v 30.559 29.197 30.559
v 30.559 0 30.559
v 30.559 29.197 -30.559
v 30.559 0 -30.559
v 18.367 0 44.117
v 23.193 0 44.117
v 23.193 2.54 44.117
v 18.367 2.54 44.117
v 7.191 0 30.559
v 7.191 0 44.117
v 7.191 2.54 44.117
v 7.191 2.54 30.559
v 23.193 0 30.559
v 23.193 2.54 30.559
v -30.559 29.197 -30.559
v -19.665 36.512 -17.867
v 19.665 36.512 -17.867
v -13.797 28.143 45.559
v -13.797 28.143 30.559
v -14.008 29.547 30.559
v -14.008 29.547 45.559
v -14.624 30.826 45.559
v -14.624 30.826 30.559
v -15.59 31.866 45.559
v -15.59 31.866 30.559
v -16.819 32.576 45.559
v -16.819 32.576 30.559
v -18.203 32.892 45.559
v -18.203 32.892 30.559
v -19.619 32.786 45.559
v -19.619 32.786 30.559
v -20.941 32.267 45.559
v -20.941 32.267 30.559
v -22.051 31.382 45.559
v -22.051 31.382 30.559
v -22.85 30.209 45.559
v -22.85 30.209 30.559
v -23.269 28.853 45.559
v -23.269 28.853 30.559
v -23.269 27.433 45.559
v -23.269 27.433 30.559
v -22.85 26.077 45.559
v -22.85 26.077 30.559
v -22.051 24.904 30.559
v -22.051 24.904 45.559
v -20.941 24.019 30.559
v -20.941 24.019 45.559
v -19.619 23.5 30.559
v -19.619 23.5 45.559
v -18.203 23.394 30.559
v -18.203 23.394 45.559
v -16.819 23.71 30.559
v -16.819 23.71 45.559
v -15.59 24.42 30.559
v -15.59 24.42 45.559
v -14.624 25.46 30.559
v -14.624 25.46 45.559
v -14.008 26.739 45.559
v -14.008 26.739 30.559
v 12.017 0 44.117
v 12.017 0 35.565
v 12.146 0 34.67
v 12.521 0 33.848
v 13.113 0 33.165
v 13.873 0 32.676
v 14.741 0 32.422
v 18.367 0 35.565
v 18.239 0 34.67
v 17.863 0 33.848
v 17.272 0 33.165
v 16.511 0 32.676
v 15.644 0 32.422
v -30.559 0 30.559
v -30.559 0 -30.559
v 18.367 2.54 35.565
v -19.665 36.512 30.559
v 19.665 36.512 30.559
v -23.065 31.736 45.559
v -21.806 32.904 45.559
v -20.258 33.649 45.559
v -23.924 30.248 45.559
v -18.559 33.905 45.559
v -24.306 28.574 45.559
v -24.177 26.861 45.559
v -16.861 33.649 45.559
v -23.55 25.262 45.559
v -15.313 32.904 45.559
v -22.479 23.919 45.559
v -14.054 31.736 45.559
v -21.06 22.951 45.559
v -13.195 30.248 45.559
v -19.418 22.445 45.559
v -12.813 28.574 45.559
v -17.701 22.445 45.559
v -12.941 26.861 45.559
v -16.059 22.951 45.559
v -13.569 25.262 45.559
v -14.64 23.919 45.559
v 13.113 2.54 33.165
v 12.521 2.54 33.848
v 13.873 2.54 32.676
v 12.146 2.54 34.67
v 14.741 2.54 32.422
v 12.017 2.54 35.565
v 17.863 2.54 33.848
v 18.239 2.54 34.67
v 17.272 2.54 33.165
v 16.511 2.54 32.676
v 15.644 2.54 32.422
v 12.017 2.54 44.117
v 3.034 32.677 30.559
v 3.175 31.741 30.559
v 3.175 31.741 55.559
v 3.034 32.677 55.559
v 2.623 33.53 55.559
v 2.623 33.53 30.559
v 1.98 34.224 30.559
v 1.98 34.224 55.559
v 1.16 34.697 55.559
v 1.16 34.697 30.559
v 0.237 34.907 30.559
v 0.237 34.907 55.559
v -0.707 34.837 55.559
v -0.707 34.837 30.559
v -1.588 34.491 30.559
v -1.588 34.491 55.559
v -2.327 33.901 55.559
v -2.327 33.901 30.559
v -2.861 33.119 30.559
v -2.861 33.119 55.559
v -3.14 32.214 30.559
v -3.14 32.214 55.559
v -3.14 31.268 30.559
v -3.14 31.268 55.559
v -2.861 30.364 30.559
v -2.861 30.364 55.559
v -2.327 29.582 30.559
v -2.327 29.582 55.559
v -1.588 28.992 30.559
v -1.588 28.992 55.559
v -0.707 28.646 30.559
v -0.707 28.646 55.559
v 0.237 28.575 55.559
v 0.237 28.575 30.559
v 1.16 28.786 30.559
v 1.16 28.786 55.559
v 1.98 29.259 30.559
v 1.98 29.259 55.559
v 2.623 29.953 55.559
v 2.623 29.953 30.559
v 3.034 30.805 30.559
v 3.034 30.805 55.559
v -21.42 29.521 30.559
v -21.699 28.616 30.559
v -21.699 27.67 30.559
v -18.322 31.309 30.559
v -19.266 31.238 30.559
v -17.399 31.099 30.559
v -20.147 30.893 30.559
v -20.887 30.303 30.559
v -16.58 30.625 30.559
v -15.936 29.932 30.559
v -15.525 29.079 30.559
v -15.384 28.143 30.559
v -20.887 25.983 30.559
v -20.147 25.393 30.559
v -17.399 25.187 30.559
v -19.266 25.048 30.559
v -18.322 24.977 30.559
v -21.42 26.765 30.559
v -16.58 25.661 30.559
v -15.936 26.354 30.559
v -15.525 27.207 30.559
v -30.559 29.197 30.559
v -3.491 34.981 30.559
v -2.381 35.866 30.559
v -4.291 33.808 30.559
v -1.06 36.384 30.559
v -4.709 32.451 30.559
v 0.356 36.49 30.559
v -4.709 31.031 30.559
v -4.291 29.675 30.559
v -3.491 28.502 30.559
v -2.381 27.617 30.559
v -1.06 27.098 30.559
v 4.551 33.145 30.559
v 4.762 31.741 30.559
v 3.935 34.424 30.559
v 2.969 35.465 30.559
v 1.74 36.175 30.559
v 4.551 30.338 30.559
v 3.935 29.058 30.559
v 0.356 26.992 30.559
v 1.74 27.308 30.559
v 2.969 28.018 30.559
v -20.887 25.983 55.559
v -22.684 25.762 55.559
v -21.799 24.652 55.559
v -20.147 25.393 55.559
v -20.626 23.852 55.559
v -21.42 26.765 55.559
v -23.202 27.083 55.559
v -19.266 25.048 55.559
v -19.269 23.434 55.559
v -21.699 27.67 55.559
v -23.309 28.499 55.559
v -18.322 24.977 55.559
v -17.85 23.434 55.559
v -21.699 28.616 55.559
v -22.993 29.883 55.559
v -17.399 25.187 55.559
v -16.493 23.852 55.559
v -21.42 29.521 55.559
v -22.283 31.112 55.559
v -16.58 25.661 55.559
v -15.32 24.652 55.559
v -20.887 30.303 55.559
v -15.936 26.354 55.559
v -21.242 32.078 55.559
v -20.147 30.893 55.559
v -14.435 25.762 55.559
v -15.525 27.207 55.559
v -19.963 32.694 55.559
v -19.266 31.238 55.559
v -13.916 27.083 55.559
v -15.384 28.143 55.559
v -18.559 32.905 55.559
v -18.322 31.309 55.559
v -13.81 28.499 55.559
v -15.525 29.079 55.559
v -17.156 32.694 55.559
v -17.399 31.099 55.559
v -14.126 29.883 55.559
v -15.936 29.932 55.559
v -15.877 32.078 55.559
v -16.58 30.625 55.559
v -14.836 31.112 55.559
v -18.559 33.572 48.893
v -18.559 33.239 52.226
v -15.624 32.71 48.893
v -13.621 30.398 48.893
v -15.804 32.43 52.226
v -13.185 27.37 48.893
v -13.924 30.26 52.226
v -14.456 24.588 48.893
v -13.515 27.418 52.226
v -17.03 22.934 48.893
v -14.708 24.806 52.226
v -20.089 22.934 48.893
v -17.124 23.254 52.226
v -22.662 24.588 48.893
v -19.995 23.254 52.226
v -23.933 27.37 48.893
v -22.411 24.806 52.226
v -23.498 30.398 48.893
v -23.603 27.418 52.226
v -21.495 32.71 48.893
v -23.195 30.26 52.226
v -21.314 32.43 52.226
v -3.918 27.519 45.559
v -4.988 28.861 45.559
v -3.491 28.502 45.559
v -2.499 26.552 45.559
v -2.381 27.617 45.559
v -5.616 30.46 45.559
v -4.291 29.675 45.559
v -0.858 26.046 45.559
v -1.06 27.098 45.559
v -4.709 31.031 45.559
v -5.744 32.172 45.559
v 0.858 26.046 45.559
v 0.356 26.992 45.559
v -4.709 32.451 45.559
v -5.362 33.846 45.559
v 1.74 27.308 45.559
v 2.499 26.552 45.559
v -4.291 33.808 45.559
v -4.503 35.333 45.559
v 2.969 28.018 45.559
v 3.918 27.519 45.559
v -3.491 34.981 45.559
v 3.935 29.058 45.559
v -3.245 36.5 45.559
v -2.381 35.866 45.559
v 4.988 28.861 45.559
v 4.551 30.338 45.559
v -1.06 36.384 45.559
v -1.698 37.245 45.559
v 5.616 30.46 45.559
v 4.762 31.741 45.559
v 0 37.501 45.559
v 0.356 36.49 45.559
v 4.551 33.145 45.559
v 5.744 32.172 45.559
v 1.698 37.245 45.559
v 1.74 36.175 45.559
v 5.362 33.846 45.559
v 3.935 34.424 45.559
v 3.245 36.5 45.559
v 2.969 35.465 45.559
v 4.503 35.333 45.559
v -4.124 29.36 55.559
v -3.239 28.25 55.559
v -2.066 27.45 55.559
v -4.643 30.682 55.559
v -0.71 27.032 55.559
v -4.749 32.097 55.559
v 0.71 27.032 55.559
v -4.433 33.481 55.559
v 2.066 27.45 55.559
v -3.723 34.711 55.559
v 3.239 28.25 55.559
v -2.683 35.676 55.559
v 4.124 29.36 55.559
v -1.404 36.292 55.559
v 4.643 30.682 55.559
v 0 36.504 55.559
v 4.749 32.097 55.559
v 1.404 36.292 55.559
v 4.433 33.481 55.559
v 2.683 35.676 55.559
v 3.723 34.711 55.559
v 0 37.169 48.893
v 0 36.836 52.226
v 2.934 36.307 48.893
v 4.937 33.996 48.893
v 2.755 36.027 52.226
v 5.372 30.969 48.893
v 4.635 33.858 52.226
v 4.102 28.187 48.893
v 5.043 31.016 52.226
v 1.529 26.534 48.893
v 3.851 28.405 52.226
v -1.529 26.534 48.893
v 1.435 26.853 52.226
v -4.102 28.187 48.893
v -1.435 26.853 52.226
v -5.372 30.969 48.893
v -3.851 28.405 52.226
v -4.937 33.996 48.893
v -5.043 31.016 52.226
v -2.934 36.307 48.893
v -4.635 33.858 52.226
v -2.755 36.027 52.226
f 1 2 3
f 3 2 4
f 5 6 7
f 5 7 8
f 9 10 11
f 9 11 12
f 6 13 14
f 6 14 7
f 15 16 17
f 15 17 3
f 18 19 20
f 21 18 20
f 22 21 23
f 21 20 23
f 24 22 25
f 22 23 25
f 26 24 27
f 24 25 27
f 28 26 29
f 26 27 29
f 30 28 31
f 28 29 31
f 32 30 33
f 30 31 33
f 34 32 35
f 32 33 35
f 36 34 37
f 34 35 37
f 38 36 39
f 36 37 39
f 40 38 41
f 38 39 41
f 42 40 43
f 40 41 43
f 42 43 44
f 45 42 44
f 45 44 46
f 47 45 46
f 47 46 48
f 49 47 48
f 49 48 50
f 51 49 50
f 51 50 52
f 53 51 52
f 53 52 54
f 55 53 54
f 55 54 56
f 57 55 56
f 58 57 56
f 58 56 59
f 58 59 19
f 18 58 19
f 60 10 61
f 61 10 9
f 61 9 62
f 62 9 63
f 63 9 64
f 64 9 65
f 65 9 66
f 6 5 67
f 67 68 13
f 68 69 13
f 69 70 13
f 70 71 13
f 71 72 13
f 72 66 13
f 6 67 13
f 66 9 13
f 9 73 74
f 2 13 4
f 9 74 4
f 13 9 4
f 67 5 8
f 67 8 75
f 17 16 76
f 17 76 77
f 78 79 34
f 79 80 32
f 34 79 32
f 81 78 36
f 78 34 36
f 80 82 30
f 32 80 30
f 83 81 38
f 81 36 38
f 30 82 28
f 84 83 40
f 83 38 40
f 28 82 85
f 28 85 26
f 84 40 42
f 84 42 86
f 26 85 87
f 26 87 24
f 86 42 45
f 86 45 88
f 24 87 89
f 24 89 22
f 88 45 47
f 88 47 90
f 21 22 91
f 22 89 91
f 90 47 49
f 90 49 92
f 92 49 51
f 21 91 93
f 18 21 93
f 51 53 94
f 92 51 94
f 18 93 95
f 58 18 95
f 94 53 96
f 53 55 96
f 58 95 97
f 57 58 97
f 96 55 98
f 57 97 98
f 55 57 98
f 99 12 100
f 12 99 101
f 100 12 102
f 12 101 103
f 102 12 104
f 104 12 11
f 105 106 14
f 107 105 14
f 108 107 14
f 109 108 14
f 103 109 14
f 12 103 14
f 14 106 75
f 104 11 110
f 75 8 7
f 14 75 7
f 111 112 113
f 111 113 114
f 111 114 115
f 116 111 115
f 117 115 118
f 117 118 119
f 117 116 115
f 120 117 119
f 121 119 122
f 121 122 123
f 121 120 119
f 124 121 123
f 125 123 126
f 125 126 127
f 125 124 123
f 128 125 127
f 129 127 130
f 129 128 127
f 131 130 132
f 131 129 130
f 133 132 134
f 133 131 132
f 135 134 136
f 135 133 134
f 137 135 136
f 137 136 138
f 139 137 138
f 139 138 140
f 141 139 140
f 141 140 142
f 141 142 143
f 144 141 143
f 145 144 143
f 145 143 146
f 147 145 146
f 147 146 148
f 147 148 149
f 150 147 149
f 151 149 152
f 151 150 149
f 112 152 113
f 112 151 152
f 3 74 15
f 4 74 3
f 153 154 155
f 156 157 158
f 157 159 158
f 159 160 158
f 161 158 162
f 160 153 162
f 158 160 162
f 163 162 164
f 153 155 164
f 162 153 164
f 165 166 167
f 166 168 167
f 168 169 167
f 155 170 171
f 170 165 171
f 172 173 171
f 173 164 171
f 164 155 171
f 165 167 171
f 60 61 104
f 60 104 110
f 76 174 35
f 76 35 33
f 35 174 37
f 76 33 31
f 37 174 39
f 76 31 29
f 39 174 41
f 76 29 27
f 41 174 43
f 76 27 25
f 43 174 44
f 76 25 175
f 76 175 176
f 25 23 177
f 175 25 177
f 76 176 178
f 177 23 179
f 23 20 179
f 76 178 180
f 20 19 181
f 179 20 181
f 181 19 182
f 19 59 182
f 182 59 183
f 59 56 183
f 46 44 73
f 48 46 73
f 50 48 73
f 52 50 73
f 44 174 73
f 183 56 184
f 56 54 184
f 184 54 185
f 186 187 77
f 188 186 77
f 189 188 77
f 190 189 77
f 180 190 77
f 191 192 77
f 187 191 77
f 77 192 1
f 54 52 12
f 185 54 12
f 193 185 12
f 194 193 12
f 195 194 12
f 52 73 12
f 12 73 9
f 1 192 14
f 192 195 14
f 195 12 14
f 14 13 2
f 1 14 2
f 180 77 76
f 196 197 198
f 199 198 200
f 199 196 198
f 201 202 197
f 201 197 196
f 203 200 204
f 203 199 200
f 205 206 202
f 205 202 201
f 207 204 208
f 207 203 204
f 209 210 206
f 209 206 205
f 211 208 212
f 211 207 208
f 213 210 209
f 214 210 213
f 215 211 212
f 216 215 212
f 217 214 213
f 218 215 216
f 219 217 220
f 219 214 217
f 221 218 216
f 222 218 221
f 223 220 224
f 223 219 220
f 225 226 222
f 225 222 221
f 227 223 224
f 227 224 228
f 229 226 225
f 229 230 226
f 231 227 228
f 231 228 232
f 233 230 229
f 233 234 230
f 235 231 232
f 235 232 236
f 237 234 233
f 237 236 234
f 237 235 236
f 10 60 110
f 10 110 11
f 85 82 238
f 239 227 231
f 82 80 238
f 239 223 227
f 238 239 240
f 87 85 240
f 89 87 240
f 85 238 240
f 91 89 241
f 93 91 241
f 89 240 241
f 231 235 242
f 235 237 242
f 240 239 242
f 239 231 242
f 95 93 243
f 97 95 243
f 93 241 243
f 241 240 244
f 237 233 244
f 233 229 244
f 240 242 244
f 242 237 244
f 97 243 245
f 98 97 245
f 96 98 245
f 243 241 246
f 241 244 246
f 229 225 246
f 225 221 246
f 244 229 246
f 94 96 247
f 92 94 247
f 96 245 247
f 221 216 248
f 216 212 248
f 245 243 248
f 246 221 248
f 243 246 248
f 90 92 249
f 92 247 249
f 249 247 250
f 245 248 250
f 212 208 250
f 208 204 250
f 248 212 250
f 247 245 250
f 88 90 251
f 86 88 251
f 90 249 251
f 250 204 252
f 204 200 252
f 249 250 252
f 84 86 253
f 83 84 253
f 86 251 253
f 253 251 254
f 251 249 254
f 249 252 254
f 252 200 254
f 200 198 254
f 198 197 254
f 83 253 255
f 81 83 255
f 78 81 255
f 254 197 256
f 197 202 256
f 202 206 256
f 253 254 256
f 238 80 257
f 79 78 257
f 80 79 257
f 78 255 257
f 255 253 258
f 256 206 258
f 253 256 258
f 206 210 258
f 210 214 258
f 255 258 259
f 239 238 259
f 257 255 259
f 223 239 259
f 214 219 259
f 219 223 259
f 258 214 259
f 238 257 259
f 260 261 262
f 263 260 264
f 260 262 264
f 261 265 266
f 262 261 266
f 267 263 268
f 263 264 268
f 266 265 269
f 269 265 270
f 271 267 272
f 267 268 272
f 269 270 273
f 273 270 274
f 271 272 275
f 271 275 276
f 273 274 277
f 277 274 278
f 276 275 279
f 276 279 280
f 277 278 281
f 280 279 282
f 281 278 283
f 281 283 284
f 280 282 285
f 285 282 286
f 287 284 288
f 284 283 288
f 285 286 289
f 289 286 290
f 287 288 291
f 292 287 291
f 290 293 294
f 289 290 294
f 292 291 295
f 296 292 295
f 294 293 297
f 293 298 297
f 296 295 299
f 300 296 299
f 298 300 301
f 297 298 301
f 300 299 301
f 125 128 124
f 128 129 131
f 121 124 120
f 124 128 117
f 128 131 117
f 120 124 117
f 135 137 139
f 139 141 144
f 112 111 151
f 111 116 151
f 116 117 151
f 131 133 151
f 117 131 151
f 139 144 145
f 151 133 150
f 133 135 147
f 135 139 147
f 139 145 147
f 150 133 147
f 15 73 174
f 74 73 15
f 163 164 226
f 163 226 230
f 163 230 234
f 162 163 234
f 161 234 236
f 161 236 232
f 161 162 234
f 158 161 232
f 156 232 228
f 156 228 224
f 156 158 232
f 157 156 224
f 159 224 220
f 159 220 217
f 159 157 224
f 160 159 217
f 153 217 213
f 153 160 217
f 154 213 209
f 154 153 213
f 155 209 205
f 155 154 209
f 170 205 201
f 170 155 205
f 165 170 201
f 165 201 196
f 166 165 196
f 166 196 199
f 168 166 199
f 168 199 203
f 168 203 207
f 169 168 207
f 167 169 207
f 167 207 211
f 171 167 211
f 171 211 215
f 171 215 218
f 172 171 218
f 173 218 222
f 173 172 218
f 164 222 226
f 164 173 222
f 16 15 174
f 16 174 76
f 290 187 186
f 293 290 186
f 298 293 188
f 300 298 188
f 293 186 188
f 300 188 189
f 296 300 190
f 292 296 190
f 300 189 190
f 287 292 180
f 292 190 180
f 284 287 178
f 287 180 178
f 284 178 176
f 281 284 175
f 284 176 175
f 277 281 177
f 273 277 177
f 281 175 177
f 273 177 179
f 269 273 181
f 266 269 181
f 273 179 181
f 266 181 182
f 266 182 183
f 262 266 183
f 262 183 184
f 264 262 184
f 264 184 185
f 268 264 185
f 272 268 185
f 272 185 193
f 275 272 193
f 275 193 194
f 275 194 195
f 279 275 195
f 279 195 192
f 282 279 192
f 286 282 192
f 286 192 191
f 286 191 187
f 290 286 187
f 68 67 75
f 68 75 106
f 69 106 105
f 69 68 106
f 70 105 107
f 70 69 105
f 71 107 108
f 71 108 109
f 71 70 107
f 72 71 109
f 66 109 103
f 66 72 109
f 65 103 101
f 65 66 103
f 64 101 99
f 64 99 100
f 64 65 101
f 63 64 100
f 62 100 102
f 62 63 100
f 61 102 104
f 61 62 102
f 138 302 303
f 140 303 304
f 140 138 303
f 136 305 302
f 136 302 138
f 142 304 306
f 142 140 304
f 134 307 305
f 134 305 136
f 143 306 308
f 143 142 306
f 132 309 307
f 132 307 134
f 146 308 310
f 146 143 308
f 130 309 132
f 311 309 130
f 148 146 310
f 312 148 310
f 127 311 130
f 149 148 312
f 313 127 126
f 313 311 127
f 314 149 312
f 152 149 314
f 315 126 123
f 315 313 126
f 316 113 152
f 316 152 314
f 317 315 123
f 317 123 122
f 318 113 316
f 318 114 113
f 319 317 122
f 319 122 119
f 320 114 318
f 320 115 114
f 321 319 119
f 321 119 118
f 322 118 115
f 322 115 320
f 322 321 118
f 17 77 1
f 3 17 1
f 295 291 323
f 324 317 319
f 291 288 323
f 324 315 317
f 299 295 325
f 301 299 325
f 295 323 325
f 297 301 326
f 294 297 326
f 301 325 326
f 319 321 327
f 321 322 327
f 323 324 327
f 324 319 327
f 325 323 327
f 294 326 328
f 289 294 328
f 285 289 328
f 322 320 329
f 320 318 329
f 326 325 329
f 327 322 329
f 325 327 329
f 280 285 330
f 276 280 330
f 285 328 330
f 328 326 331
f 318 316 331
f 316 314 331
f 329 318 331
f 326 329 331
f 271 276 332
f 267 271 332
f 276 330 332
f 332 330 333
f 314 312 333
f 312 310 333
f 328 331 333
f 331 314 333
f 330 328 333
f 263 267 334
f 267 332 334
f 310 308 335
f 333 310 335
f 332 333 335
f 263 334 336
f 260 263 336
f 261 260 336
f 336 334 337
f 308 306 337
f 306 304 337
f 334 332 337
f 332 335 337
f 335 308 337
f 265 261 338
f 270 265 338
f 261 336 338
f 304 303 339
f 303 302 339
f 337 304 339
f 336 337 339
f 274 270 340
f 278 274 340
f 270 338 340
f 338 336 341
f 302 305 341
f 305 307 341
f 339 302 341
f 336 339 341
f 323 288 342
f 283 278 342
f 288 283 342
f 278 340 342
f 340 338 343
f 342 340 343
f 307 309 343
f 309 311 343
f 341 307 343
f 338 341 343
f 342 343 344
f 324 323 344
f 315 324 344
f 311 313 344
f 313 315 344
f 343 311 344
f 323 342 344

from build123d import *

# Parameters (mm, degrees)
SKETCH1_W          = 61.11875
SKETCH1_H          = 61.11875
EXTRUDE1_DEPTH     = 36.5125
SKETCH3_OUTSIDE_W  = 81.884
SKETCH3_OUTSIDE_H  = 57.278
CUT_EXTRUDE7_DEPTH = 62
SKETCH4_OUTSIDE_W  = 81.884
SKETCH4_OUTSIDE_H  = 57.278
CUT_EXTRUDE8_DEPTH = 250
SKETCH2_R          = 4.7625
SKETCH2_R_2        = 3.175
EXTRUDE2_DEPTH     = 25
SKETCH5_R          = 4.7625
SKETCH5_R_2        = 3.175
EXTRUDE3_DEPTH     = 25
EXTRUDE4_DEPTH     = 2.54
SKETCH7_R          = 5.76
SKETCH7_R_2        = 4.7625
EXTRUDE5_DEPTH     = 10


with BuildPart() as part:
    # Sketch1 → Extrude1 (new body)
    with BuildSketch(Plane(origin=(0, 0, 0), x_dir=(1, 0, 0), z_dir=(0, 1, 0))):
        Rectangle(SKETCH1_W, SKETCH1_H)
    extrude(amount=EXTRUDE1_DEPTH)

    # Sketch3 outside → Cut-Extrude7 (cut)
    with BuildSketch(Plane.XY.offset(30.559375)):
        with Locations((0, 18.256)):
            Rectangle(SKETCH3_OUTSIDE_W, SKETCH3_OUTSIDE_H)
        Polygon((19.664807265, 36.5125), (30.559375, 29.197130008), (30.559375, 0), (-30.559375, 0), (-30.559375, 29.197130008), (-19.664807265, 36.5125), align=None, mode=Mode.SUBTRACT)
    extrude(amount=-CUT_EXTRUDE7_DEPTH, mode=Mode.SUBTRACT)

    # Sketch4 outside → Cut-Extrude8 (cut)
    with BuildSketch(Plane(origin=(30.559375, 0, 0), x_dir=(0, 0, -1), z_dir=(1, 0, 0))):
        with Locations((0, 18.256)):
            Rectangle(SKETCH4_OUTSIDE_W, SKETCH4_OUTSIDE_H)
        Polygon((-30.559375, 36.5125), (17.867202311, 36.5125), (30.559375, 29.197130008), (30.559375, 0), (-30.559375, 0), align=None, mode=Mode.SUBTRACT)
    extrude(amount=-CUT_EXTRUDE8_DEPTH, mode=Mode.SUBTRACT)

    # Sketch2 → Extrude2 (add)
    with BuildSketch(Plane.XY.offset(30.559375)):
        with Locations((0, 31.741283107)):
            Circle(SKETCH2_R)
        with Locations((0, 31.741283107)):
            Circle(SKETCH2_R_2, mode=Mode.SUBTRACT)
    extrude(amount=EXTRUDE2_DEPTH)

    # Sketch5 → Extrude3 (add)
    with BuildSketch(Plane.XY.offset(30.559375)):
        with Locations((-18.559375, 28.142983961)):
            Circle(SKETCH5_R)
        with Locations((-18.559375, 28.142983961)):
            Circle(SKETCH5_R_2, mode=Mode.SUBTRACT)
    extrude(amount=EXTRUDE3_DEPTH)

    # Sketch6 → Extrude4 (add)
    with BuildSketch(Plane.XZ):
        with BuildLine():
            Line((7.191375, 30.559375), (23.193375, 30.559375))
            Line((23.193375, 30.559375), (23.193375, 44.116625))
            Line((23.193375, 44.116625), (18.367375, 44.116625))
            Line((18.367375, 44.116625), (18.367375, 35.564523256))
            ThreePointArc((18.367375, 35.564523256), (15.192375, 32.389523256), (12.017375, 35.564523256))
            Line((12.017375, 35.564523256), (12.017375, 44.116625))
            Line((12.017375, 44.116625), (7.191375, 44.116625))
            Line((7.191375, 44.116625), (7.191375, 30.559375))
        make_face()
    extrude(amount=-EXTRUDE4_DEPTH)

    # Sketch7 → Extrude5 (add)
    with BuildSketch(Plane.XY.offset(55.559375)):
        with Locations((0, 31.741283107)):
            Circle(SKETCH7_R)
        with Locations((0, 31.741283107)):
            Circle(SKETCH7_R_2, mode=Mode.SUBTRACT)
    extrude(amount=-EXTRUDE5_DEPTH)

    # Sketch8 → Cut-Revolve2 (revolve, cut)
    with BuildSketch(Plane(origin=(0, 0, 0), x_dir=(0, 0, -1), z_dir=(1, 0, 0))):
        Polygon((-55.559375, 36.503783107), (-55.559375, 37.501283107), (-45.559375, 37.501283107), align=None)
    revolve(axis=Axis((0, 31.741283107, 55.559375), (0, 0, -1)), mode=Mode.SUBTRACT)

    # Sketch10 → Revolve1 (revolve)
    with BuildSketch(Plane(origin=(-18.559375, 0, 0), x_dir=(0, 0, -1), z_dir=(1, 0, 0))):
        Polygon((-55.559375, 32.905483961), (-45.559375, 32.905483961), (-45.559375, 33.905483961), align=None)
    revolve(axis=Axis((-18.559375, 28.142983961, 55.559375), (0, 0, -1)))


solid = part.part
